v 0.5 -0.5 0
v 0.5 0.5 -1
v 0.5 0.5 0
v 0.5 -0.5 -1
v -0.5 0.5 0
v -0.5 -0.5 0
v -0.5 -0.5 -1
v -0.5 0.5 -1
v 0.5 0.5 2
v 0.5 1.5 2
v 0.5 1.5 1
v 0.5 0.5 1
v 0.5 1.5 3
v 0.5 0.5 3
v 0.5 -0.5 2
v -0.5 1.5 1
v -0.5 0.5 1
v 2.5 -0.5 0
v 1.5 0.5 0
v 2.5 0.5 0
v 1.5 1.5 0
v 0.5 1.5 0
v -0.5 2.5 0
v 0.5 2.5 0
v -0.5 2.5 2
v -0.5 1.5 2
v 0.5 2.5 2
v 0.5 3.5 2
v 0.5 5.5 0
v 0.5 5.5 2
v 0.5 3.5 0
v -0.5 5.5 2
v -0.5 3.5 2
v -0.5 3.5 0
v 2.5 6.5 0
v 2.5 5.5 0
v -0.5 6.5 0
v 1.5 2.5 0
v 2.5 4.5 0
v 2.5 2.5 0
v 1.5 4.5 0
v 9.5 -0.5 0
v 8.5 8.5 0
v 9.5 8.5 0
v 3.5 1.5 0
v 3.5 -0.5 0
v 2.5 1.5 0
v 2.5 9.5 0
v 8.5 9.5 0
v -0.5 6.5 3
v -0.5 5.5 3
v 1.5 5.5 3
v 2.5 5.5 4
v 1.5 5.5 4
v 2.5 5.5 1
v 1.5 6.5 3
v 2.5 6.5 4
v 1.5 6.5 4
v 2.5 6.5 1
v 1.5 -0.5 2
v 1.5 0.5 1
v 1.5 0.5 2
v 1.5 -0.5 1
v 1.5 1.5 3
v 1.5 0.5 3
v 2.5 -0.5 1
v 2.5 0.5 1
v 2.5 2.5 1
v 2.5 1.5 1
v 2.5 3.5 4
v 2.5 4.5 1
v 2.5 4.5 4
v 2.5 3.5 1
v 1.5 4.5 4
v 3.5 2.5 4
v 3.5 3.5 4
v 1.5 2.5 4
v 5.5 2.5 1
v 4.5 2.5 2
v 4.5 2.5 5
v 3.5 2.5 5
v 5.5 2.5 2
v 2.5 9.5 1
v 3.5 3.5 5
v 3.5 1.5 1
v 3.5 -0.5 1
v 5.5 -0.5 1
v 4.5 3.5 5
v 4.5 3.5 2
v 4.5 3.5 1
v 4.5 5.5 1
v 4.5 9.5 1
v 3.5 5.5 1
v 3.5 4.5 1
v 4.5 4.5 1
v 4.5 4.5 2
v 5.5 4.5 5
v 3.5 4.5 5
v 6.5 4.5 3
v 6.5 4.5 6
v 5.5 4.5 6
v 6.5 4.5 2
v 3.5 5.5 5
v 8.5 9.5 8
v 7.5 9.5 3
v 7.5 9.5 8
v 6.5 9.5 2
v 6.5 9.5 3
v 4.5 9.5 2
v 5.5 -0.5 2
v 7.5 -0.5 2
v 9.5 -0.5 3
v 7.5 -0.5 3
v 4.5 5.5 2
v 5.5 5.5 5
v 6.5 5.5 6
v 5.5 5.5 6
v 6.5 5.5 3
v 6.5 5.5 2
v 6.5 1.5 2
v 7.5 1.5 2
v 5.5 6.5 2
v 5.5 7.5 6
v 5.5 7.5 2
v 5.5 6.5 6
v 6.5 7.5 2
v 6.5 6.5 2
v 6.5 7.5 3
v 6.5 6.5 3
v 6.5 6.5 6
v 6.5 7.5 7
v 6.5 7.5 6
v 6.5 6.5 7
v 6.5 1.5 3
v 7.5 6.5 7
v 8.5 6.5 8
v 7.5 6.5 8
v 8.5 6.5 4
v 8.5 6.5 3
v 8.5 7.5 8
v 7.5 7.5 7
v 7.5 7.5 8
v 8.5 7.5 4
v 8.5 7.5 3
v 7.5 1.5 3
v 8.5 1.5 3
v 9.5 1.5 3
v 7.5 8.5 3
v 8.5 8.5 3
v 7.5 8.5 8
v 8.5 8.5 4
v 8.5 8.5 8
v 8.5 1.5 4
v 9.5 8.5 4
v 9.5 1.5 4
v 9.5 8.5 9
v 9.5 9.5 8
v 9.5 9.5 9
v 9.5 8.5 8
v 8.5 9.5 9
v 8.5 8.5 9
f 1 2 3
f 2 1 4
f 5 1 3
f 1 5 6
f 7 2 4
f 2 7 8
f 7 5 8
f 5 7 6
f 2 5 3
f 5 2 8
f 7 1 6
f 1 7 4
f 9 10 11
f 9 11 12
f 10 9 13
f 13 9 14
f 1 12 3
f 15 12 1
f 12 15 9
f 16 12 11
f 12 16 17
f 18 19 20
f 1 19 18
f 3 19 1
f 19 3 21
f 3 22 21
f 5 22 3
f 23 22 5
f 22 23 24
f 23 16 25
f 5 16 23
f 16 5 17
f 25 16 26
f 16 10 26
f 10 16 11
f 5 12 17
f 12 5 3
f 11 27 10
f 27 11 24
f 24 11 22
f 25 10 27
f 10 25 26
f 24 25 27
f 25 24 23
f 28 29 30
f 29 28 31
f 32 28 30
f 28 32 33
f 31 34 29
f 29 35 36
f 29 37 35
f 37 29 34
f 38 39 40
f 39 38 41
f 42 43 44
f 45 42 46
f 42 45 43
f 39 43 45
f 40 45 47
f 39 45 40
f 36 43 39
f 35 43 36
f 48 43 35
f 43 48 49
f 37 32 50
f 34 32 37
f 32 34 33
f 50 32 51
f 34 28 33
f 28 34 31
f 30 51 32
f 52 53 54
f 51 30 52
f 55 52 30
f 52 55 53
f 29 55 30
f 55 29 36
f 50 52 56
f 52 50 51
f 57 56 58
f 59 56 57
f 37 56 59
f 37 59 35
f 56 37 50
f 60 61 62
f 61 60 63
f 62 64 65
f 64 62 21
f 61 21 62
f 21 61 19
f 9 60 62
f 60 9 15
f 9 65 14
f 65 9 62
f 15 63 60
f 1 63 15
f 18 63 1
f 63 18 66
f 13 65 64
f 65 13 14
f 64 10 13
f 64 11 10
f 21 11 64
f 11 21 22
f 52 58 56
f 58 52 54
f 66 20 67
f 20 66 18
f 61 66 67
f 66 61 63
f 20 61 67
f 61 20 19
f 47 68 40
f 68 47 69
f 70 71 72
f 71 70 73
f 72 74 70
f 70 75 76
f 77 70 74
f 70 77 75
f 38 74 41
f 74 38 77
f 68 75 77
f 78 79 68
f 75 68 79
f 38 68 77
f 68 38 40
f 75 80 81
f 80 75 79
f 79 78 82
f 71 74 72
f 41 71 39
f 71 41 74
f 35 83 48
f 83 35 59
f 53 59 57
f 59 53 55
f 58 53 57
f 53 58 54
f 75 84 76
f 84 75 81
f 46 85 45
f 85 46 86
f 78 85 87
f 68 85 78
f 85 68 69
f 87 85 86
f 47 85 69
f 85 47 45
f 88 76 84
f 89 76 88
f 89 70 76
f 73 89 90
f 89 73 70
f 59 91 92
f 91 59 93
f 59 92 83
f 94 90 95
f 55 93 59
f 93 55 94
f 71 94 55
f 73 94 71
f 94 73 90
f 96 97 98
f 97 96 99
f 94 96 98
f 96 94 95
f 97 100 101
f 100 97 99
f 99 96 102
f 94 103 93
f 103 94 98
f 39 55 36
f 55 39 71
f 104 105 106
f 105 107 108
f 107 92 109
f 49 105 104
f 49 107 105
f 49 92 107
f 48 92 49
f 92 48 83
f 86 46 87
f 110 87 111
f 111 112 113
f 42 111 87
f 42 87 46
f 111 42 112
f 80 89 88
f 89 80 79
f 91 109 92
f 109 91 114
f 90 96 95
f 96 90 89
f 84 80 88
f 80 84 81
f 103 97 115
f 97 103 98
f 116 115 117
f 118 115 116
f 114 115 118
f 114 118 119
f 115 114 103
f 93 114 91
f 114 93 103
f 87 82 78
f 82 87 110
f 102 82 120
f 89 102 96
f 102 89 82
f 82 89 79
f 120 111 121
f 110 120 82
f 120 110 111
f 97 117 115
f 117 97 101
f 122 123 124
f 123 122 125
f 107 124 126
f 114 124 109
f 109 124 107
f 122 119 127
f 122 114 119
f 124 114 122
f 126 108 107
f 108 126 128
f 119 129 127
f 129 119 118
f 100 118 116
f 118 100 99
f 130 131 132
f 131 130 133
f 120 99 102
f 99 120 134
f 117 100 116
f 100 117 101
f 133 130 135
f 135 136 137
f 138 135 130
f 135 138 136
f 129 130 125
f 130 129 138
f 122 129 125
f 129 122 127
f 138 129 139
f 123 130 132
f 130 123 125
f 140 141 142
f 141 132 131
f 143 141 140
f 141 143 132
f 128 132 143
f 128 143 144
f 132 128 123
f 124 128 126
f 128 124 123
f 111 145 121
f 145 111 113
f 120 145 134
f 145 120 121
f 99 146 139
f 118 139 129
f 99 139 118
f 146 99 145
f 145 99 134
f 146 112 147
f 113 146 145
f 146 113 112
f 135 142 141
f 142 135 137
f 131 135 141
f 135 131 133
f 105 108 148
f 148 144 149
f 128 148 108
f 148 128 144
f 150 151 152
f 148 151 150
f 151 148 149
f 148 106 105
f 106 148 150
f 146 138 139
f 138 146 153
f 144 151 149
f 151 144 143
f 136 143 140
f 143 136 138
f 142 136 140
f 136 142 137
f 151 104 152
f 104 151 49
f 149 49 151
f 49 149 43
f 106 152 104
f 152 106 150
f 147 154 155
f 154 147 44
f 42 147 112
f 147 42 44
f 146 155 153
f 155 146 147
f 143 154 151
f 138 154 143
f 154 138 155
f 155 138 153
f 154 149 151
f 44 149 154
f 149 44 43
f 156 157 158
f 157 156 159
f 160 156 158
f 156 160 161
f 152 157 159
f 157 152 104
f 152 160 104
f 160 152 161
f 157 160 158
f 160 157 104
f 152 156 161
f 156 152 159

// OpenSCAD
union() {
    translate([0, 0, -0.5]) color([1, 0, 0]) cube([1, 1, 1], center=true);
    translate([0, 1, 0.5]) cube([1, 1, 1], center=true);
    translate([0, 2, 1.0]) cube([1, 1, 2], center=true);
    translate([0, 4, 1.0]) cube([1, 1, 2], center=true);
    translate([0, 5, 1.0]) cube([1, 1, 2], center=true);
    translate([0, 6, 1.5]) cube([1, 1, 3], center=true);
    translate([1, 0, 1.0]) cube([1, 1, 2], center=true);
    translate([1, 1, 1.5]) cube([1, 1, 3], center=true);
    translate([1, 6, 1.5]) cube([1, 1, 3], center=true);
    translate([2, 0, 0.5]) cube([1, 1, 1], center=true);
    translate([2, 3, 2.0]) cube([1, 1, 4], center=true);
    translate([2, 4, 2.0]) cube([1, 1, 4], center=true);
    translate([2, 6, 2.0]) cube([1, 1, 4], center=true);
    translate([3, 2, 0.5]) cube([1, 1, 1], center=true);
    translate([3, 3, 2.0]) cube([1, 1, 4], center=true);
    translate([3, 4, 0.5]) cube([1, 1, 1], center=true);
    translate([3, 5, 0.5]) cube([1, 1, 1], center=true);
    translate([3, 6, 0.5]) cube([1, 1, 1], center=true);
    translate([3, 7, 0.5]) cube([1, 1, 1], center=true);
    translate([3, 8, 0.5]) cube([1, 1, 1], center=true);
    translate([3, 9, 0.5]) cube([1, 1, 1], center=true);
    translate([4, 0, 0.5]) cube([1, 1, 1], center=true);
    translate([4, 1, 0.5]) cube([1, 1, 1], center=true);
    translate([4, 2, 0.5]) cube([1, 1, 1], center=true);
    translate([4, 3, 2.5]) cube([1, 1, 5], center=true);
    translate([4, 4, 0.5]) cube([1, 1, 1], center=true);
    translate([4, 5, 2.5]) cube([1, 1, 5], center=true);
    translate([4, 6, 0.5]) cube([1, 1, 1], center=true);
    translate([4, 7, 0.5]) cube([1, 1, 1], center=true);
    translate([4, 8, 0.5]) cube([1, 1, 1], center=true);
    translate([4, 9, 0.5]) cube([1, 1, 1], center=true);
    translate([5, 0, 0.5]) cube([1, 1, 1], center=true);
    translate([5, 1, 0.5]) cube([1, 1, 1], center=true);
    translate([5, 2, 0.5]) cube([1, 1, 1], center=true);
    translate([5, 3, 1.0]) cube([1, 1, 2], center=true);
    translate([5, 4, 1.0]) cube([1, 1, 2], center=true);
    translate([5, 5, 2.5]) cube([1, 1, 5], center=true);
    translate([5, 6, 1.0]) cube([1, 1, 2], center=true);
    translate([5, 7, 1.0]) cube([1, 1, 2], center=true);
    translate([5, 8, 1.0]) cube([1, 1, 2], center=true);
    translate([5, 9, 1.0]) cube([1, 1, 2], center=true);
    translate([6, 0, 1.0]) cube([1, 1, 2], center=true);
    translate([6, 1, 1.0]) cube([1, 1, 2], center=true);
    translate([6, 2, 1.0]) cube([1, 1, 2], center=true);
    translate([6, 3, 1.0]) cube([1, 1, 2], center=true);
    translate([6, 4, 1.0]) cube([1, 1, 2], center=true);
    translate([6, 5, 3.0]) cube([1, 1, 6], center=true);
    translate([6, 6, 1.0]) cube([1, 1, 2], center=true);
    translate([6, 7, 3.0]) cube([1, 1, 6], center=true);
    translate([6, 8, 1.0]) cube([1, 1, 2], center=true);
    translate([6, 9, 1.0]) cube([1, 1, 2], center=true);
    translate([7, 0, 1.0]) cube([1, 1, 2], center=true);
    translate([7, 1, 1.0]) cube([1, 1, 2], center=true);
    translate([7, 2, 1.5]) cube([1, 1, 3], center=true);
    translate([7, 3, 1.5]) cube([1, 1, 3], center=true);
    translate([7, 4, 1.5]) cube([1, 1, 3], center=true);
    translate([7, 5, 1.5]) cube([1, 1, 3], center=true);
    translate([7, 6, 1.5]) cube([1, 1, 3], center=true);
    translate([7, 7, 3.5]) cube([1, 1, 7], center=true);
    translate([7, 8, 1.5]) cube([1, 1, 3], center=true);
    translate([7, 9, 1.5]) cube([1, 1, 3], center=true);
    translate([8, 0, 1.5]) cube([1, 1, 3], center=true);
    translate([8, 1, 1.5]) cube([1, 1, 3], center=true);
    translate([8, 2, 1.5]) cube([1, 1, 3], center=true);
    translate([8, 3, 1.5]) cube([1, 1, 3], center=true);
    translate([8, 4, 1.5]) cube([1, 1, 3], center=true);
    translate([8, 5, 1.5]) cube([1, 1, 3], center=true);
    translate([8, 6, 1.5]) cube([1, 1, 3], center=true);
    translate([8, 7, 4.0]) cube([1, 1, 8], center=true);
    translate([8, 8, 1.5]) cube([1, 1, 3], center=true);
    translate([8, 9, 4.0]) cube([1, 1, 8], center=true);
    translate([9, 0, 1.5]) cube([1, 1, 3], center=true);
    translate([9, 1, 1.5]) cube([1, 1, 3], center=true);
    translate([9, 2, 2.0]) cube([1, 1, 4], center=true);
    translate([9, 3, 2.0]) cube([1, 1, 4], center=true);
    translate([9, 4, 2.0]) cube([1, 1, 4], center=true);
    translate([9, 5, 2.0]) cube([1, 1, 4], center=true);
    translate([9, 6, 2.0]) cube([1, 1, 4], center=true);
    translate([9, 7, 2.0]) cube([1, 1, 4], center=true);
    translate([9, 8, 2.0]) cube([1, 1, 4], center=true);
    translate([9, 9, 8.5]) color([0, 0, 1]) cube([1, 1, 1], center=true);
}
